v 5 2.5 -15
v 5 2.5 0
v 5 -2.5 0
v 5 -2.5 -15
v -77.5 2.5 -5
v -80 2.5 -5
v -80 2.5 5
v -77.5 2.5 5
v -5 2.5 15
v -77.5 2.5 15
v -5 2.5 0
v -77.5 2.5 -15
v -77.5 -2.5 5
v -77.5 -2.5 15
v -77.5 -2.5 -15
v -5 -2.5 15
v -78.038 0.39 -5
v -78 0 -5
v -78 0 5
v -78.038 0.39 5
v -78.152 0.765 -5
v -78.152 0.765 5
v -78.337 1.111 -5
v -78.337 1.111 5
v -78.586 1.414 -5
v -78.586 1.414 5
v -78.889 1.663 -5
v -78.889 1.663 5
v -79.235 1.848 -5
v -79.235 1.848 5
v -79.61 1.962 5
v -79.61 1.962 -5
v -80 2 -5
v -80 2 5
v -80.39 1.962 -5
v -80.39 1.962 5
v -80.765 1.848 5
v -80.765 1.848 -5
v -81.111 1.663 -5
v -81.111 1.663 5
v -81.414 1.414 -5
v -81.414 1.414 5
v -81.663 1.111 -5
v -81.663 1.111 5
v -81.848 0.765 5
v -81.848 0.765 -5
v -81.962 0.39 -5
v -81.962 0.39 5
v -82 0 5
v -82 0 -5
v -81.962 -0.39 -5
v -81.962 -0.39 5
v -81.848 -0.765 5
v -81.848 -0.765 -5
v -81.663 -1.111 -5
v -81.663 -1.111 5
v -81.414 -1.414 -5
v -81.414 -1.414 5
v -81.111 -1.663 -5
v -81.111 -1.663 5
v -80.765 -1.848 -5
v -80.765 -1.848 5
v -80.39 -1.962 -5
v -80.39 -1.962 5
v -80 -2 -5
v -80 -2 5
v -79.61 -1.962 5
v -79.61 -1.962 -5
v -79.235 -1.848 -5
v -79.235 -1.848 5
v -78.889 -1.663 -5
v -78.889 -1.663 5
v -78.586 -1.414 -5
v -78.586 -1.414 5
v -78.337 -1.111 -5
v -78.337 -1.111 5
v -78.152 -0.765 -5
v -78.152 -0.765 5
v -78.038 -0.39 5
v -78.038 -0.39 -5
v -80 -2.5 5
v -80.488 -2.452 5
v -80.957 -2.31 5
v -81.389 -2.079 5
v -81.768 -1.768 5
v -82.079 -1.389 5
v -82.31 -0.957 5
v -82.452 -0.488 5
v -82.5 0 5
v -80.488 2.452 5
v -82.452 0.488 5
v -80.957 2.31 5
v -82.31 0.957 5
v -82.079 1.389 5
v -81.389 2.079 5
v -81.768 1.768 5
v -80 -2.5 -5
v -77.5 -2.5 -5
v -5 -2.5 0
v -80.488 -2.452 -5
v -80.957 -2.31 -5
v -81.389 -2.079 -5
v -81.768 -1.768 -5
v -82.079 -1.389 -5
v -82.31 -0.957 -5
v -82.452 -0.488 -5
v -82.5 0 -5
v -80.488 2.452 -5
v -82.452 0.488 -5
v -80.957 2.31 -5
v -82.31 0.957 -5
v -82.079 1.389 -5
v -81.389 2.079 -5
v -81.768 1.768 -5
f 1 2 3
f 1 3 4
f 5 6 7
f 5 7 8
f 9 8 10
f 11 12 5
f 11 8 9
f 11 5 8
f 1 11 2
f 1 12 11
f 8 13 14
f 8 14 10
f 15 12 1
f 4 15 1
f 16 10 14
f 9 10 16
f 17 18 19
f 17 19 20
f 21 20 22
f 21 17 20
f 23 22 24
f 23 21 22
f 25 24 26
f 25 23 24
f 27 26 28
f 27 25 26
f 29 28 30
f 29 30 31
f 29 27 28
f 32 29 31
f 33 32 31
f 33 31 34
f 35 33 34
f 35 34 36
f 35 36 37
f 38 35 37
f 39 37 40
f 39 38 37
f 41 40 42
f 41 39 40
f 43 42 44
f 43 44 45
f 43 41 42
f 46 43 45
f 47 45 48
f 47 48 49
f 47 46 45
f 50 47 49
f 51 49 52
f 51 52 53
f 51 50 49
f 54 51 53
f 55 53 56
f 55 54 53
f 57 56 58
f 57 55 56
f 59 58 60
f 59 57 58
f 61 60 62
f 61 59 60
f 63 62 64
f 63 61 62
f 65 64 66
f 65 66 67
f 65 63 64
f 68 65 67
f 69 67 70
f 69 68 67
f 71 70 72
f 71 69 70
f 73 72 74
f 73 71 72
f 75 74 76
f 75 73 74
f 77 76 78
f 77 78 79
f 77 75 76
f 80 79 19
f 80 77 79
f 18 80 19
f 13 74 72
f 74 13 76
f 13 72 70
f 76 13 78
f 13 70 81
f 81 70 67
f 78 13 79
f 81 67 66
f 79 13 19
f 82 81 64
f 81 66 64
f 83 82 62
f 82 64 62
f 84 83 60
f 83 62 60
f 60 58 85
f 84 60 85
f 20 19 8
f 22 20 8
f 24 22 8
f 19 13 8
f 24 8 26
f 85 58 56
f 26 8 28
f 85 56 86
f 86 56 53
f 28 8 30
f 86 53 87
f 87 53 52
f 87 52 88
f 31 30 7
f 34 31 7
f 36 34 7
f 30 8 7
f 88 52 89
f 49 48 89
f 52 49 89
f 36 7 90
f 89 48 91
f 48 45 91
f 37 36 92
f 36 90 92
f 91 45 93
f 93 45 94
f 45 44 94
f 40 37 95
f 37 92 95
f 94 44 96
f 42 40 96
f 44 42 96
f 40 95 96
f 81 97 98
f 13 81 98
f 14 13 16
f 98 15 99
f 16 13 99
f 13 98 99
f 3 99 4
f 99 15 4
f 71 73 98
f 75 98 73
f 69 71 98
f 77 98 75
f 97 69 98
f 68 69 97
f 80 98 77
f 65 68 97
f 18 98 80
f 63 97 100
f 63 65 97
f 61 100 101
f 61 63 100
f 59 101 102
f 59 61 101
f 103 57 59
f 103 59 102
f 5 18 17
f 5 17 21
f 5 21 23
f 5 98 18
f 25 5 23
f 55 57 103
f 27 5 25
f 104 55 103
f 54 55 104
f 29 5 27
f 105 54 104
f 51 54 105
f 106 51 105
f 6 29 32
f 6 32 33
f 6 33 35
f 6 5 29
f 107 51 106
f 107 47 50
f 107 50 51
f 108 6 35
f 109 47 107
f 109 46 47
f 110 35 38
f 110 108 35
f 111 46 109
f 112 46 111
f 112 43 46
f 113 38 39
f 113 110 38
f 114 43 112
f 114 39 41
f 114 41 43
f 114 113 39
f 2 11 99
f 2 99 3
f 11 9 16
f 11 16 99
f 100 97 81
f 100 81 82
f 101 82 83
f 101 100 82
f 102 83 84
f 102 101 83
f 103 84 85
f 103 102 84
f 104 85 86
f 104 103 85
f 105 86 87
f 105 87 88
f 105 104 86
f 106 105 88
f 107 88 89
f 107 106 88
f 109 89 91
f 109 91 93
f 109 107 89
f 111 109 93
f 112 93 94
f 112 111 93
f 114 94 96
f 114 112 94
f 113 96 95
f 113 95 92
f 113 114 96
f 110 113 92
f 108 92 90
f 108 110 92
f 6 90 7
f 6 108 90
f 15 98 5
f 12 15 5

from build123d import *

# Parameters (mm, degrees)
BASE_DEPTH              = 5
BASE_DEPTH_BACK         = 5
ESQUISSE1_R             = 2
ESQUISSE2_W             = 77.5
ESQUISSE2_H             = 5
BOSS_EXTRU_2_DEPTH      = 10
ESQUISSE3_W             = 77.5
ESQUISSE3_H             = 5
BOSS_EXTRU_3_DEPTH      = 10
ESQUISSE4_W             = 5
ESQUISSE4_H             = 15
BOSS_EXTRU_4_DEPTH      = 5
ESQUISSE5_W             = 5
ESQUISSE5_H             = 15
ENL_V_MAT_EXTRU_1_DEPTH = 5


with BuildPart() as part:
    # Esquisse1 → BASE (new, two sides: drawn at the far end of the back side and taken through both)
    with BuildSketch(Plane.XY.offset(-BASE_DEPTH_BACK)):
        with BuildLine():
            Line((-80, 2.5), (0, 2.5))
            Line((0, 2.5), (0, -2.5))
            Line((0, -2.5), (-80, -2.5))
            ThreePointArc((-80, -2.5), (-82.5, 0), (-80, 2.5))
        make_face()
        with Locations((-80, 0)):
            Circle(ESQUISSE1_R, mode=Mode.SUBTRACT)
    extrude(amount=BASE_DEPTH + BASE_DEPTH_BACK)

    # Esquisse2 → Boss.-Extru.2 (add)
    with BuildSketch(Plane.XY.offset(5)):
        with Locations((-38.75, 0)):
            Rectangle(ESQUISSE2_W, ESQUISSE2_H)
    extrude(amount=BOSS_EXTRU_2_DEPTH)

    # Esquisse3 → Boss.-Extru.3 (add)
    with BuildSketch(Plane(origin=(0, 0, -5), x_dir=(-1, 0, 0), z_dir=(0, 0, -1))):
        with Locations((38.75, 0)):
            Rectangle(ESQUISSE3_W, ESQUISSE3_H)
    extrude(amount=BOSS_EXTRU_3_DEPTH)

    # Esquisse4 → Boss.-Extru.4 (add)
    with BuildSketch(Plane(origin=(0, 2.5, 0), x_dir=(1, 0, 0), z_dir=(0, 1, 0))):
        with Locations((2.5, 7.5)):
            Rectangle(ESQUISSE4_W, ESQUISSE4_H)
    extrude(amount=-BOSS_EXTRU_4_DEPTH)

    # Esquisse5 → Enlèv. mat.-Extru.1 (cut)
    with BuildSketch(Plane(origin=(0, 2.5, 0), x_dir=(1, 0, 0), z_dir=(0, 1, 0))):
        with Locations((-2.5, -7.5)):
            Rectangle(ESQUISSE5_W, ESQUISSE5_H)
    extrude(amount=-ENL_V_MAT_EXTRU_1_DEPTH, mode=Mode.SUBTRACT)


solid = part.part
